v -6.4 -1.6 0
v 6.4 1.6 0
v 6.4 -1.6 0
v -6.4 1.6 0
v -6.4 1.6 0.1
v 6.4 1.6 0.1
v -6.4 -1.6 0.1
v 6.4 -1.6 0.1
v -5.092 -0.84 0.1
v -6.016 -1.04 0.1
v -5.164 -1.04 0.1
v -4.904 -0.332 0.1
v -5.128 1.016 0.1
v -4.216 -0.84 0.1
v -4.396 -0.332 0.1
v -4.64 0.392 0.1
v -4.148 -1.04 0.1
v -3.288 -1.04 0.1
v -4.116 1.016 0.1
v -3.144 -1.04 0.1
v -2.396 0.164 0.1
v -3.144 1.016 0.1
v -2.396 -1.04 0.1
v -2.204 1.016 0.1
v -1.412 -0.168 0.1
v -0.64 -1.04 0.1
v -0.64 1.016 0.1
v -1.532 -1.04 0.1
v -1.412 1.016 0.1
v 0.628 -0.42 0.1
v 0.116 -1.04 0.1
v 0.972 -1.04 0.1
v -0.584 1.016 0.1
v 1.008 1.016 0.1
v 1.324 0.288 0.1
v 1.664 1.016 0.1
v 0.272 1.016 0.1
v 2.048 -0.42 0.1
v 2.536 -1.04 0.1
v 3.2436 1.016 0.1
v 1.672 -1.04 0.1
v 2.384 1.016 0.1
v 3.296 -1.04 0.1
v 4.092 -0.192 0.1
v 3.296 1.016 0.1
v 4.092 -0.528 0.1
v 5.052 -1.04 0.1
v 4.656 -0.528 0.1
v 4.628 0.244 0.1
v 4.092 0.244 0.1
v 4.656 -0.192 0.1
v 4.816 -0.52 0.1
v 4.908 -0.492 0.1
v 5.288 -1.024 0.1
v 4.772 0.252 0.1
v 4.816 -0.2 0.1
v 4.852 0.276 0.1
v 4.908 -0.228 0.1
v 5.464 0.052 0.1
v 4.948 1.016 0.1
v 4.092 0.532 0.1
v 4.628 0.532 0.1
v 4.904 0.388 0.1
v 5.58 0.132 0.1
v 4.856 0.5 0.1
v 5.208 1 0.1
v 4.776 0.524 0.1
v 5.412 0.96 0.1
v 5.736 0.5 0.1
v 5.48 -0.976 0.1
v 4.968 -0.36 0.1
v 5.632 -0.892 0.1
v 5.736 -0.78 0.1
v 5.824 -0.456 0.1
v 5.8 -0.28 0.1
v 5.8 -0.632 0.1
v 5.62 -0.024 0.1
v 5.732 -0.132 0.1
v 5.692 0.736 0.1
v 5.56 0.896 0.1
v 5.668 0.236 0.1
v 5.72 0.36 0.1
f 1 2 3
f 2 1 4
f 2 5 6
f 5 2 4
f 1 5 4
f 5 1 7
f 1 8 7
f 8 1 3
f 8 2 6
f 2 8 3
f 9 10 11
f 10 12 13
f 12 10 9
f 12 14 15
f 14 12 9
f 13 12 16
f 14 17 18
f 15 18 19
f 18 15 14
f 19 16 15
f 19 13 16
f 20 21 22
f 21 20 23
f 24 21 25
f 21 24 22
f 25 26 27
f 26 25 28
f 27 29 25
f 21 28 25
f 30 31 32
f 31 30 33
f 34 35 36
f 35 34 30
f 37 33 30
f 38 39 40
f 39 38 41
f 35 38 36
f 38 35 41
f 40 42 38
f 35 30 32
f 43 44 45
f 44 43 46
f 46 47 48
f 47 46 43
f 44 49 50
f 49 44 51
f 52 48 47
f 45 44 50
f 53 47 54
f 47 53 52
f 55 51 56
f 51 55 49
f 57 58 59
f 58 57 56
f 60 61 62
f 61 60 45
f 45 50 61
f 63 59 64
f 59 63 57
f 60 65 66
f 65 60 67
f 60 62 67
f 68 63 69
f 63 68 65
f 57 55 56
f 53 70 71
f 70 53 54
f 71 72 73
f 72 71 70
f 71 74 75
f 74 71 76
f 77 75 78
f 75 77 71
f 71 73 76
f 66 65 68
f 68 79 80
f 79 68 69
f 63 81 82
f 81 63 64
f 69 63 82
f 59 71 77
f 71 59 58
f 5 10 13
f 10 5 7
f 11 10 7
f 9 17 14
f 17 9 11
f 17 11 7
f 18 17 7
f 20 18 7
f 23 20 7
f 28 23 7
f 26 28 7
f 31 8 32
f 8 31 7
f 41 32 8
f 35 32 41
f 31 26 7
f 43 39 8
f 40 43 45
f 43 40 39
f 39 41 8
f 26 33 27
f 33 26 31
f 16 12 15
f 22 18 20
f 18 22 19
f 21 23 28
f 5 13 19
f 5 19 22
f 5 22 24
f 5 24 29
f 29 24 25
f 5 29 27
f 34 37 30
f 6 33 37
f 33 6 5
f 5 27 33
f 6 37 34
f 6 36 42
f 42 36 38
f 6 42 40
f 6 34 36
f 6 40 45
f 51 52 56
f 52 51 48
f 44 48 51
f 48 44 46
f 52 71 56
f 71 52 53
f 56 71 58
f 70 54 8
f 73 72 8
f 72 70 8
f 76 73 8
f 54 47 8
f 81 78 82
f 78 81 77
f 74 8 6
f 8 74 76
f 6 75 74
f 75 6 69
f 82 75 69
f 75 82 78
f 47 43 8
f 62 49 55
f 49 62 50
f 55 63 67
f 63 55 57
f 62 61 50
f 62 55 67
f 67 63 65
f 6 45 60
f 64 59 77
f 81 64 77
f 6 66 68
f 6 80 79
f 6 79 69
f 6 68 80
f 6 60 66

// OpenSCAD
// file: ../p/box5-12.scad
use <../lib.scad>
function ldraw_lib__box5_12() = [
// 0 Box with 5 Faces without Any Edges
// 0 Name: box5-12.dat
// 0 Author: Chris Dee [cwdee]
// 0 !LDRAW_ORG Primitive UPDATE 2009-02
// 0 !LICENSE Licensed under CC BY 4.0 : see CAreadme.txt
// 
// 0 BFC CERTIFY CCW
  [0,"BFC","CERTIFY"],
  [0,"BFC","CCW"],
// 
// 0 !HISTORY 2009-09-03 [PTadmin] Official Update 2009-02
// 
// 
// 4 16 1 1 1 1 1 -1 -1 1 -1 -1 1 1
  [4,16,1,1,1,1,1,-1,-1,1,-1,-1,1,1],
// 4 16 -1 0 1 1 0 1 1 1 1 -1 1 1
  [4,16,-1,0,1,1,0,1,1,1,1,-1,1,1],
// 4 16 -1 0 -1 -1 0 1 -1 1 1 -1 1 -1
  [4,16,-1,0,-1,-1,0,1,-1,1,1,-1,1,-1],
// 4 16 1 0 -1 -1 0 -1 -1 1 -1 1 1 -1
  [4,16,1,0,-1,-1,0,-1,-1,1,-1,1,1,-1],
// 4 16 1 0 1 1 0 -1 1 1 -1 1 1 1
  [4,16,1,0,1,1,0,-1,1,1,-1,1,1,1],
// 0
];
module ldraw_lib__box5_12(step=0, col=false, unit=2/5, alt=false, line=0.2, solid=!$preview)
    makepoly(ldraw_lib__box5_12(), step=step, col=col, unit=unit, alt=alt, line=line, solid=solid);
ldraw_lib__box5_12(line=0.2);
// main file
use <../lib.scad>
use <../p/box5-12.scad>
function ldraw_lib__194535a() = [
// 0 Sticker  0.4 x  1.6 with Black "ANWB" on Transparent Background
// 0 Name: 194535a.dat
// 0 Author: Takeshi Takahashi [RainbowDolphin]
// 0 !LDRAW_ORG Part UPDATE 2023-01
// 0 !LICENSE Licensed under CC BY 4.0 : see CAreadme.txt
// 
// 0 BFC CERTIFY CCW
  [0,"BFC","CERTIFY"],
  [0,"BFC","CCW"],
// 
// 0 !KEYWORDS Bricklink 1590.2stk01, Brickowl 599539, Netherlands
// 0 !KEYWORDS Rebrickable 194535, Road service, Set 1590-2
// 
// 0 !HISTORY 2023-03-05 [OrionP] Official Update 2023-01
// 
// 
// 1 16 0 -0.25 0 16 0 0 0 0.25 0 0 0 4 box5-12.dat
  [1,16,0,-0.25,0,16,0,0,0,0.25,0,0,0,4, ldraw_lib__box5_12()],
// 0 BFC NOCLIP
  [0,"BFC","NOCLIP"],
// 3 0 -12.73 -0.25 -2.1 -15.04 -0.25 -2.6 -12.91 -0.25 -2.6
  [3,0,-12.73,-0.25,-2.1,-15.04,-0.25,-2.6,-12.91,-0.25,-2.6],
// 4 0 -12.26 -0.25 -0.83 -12.82 -0.25 2.54 -15.04 -0.25 -2.6 -12.73 -0.25 -2.1
  [4,0,-12.26,-0.25,-0.83,-12.82,-0.25,2.54,-15.04,-0.25,-2.6,-12.73,-0.25,-2.1],
// 4 0 -12.26 -0.25 -0.83 -12.73 -0.25 -2.1 -10.54 -0.25 -2.1 -10.99 -0.25 -0.83
  [4,0,-12.26,-0.25,-0.83,-12.73,-0.25,-2.1,-10.54,-0.25,-2.1,-10.99,-0.25,-0.83],
// 3 0 -12.82 -0.25 2.54 -12.26 -0.25 -0.83 -11.6 -0.25 0.98
  [3,0,-12.82,-0.25,2.54,-12.26,-0.25,-0.83,-11.6,-0.25,0.98],
// 3 0 -10.54 -0.25 -2.1 -10.37 -0.25 -2.6 -8.22 -0.25 -2.6
  [3,0,-10.54,-0.25,-2.1,-10.37,-0.25,-2.6,-8.22,-0.25,-2.6],
// 4 0 -10.99 -0.25 -0.83 -10.54 -0.25 -2.1 -8.22 -0.25 -2.6 -10.29 -0.25 2.54
  [4,0,-10.99,-0.25,-0.83,-10.54,-0.25,-2.1,-8.22,-0.25,-2.6,-10.29,-0.25,2.54],
// 3 0 -10.29 -0.25 2.54 -11.6 -0.25 0.98 -10.99 -0.25 -0.83
  [3,0,-10.29,-0.25,2.54,-11.6,-0.25,0.98,-10.99,-0.25,-0.83],
// 3 0 -10.29 -0.25 2.54 -12.82 -0.25 2.54 -11.6 -0.25 0.98
  [3,0,-10.29,-0.25,2.54,-12.82,-0.25,2.54,-11.6,-0.25,0.98],
// 4 0 -7.86 -0.25 -2.6 -5.99 -0.25 -2.6 -5.99 -0.25 0.41 -7.86 -0.25 2.54
  [4,0,-7.86,-0.25,-2.6,-5.99,-0.25,-2.6,-5.99,-0.25,0.41,-7.86,-0.25,2.54],
// 4 0 -5.51 -0.25 2.54 -7.86 -0.25 2.54 -5.99 -0.25 0.41 -3.53 -0.25 -0.42
  [4,0,-5.51,-0.25,2.54,-7.86,-0.25,2.54,-5.99,-0.25,0.41,-3.53,-0.25,-0.42],
// 4 0 -3.53 -0.25 -0.42 -3.83 -0.25 -2.6 -1.6 -0.25 -2.6 -1.6 -0.25 2.54
  [4,0,-3.53,-0.25,-0.42,-3.83,-0.25,-2.6,-1.6,-0.25,-2.6,-1.6,-0.25,2.54],
// 3 0 -1.6 -0.25 2.54 -3.53 -0.25 2.54 -3.53 -0.25 -0.42
  [3,0,-1.6,-0.25,2.54,-3.53,-0.25,2.54,-3.53,-0.25,-0.42],
// 3 0 -5.99 -0.25 0.41 -3.83 -0.25 -2.6 -3.53 -0.25 -0.42
  [3,0,-5.99,-0.25,0.41,-3.83,-0.25,-2.6,-3.53,-0.25,-0.42],
// 4 0 0.29 -0.25 -2.6 2.43 -0.25 -2.6 1.57 -0.25 -1.05 -1.46 -0.25 2.54
  [4,0,0.29,-0.25,-2.6,2.43,-0.25,-2.6,1.57,-0.25,-1.05,-1.46,-0.25,2.54],
// 4 0 2.52 -0.25 2.54 1.57 -0.25 -1.05 3.31 -0.25 0.72 4.16 -0.25 2.54
  [4,0,2.52,-0.25,2.54,1.57,-0.25,-1.05,3.31,-0.25,0.72,4.16,-0.25,2.54],
// 3 0 0.68 -0.25 2.54 -1.46 -0.25 2.54 1.57 -0.25 -1.05
  [3,0,0.68,-0.25,2.54,-1.46,-0.25,2.54,1.57,-0.25,-1.05],
// 4 0 5.12 -0.25 -1.05 4.18 -0.25 -2.6 6.34 -0.25 -2.6 8.109 -0.25 2.54
  [4,0,5.12,-0.25,-1.05,4.18,-0.25,-2.6,6.34,-0.25,-2.6,8.109,-0.25,2.54],
// 4 0 3.31 -0.25 0.72 4.18 -0.25 -2.6 5.12 -0.25 -1.05 4.16 -0.25 2.54
  [4,0,3.31,-0.25,0.72,4.18,-0.25,-2.6,5.12,-0.25,-1.05,4.16,-0.25,2.54],
// 3 0 8.109 -0.25 2.54 5.96 -0.25 2.54 5.12 -0.25 -1.05
  [3,0,8.109,-0.25,2.54,5.96,-0.25,2.54,5.12,-0.25,-1.05],
// 3 0 3.31 -0.25 0.72 1.57 -0.25 -1.05 2.43 -0.25 -2.6
  [3,0,3.31,-0.25,0.72,1.57,-0.25,-1.05,2.43,-0.25,-2.6],
// 4 0 8.24 -0.25 -2.6 10.23 -0.25 -1.32 10.23 -0.25 -0.48 8.24 -0.25 2.54
  [4,0,8.24,-0.25,-2.6,10.23,-0.25,-1.32,10.23,-0.25,-0.48,8.24,-0.25,2.54],
// 4 0 12.63 -0.25 -2.6 11.64 -0.25 -1.32 10.23 -0.25 -1.32 8.24 -0.25 -2.6
  [4,0,12.63,-0.25,-2.6,11.64,-0.25,-1.32,10.23,-0.25,-1.32,8.24,-0.25,-2.6],
// 4 0 11.57 -0.25 0.61 10.23 -0.25 0.61 10.23 -0.25 -0.48 11.64 -0.25 -0.48
  [4,0,11.57,-0.25,0.61,10.23,-0.25,0.61,10.23,-0.25,-0.48,11.64,-0.25,-0.48],
// 3 0 12.04 -0.25 -1.3 11.64 -0.25 -1.32 12.63 -0.25 -2.6
  [3,0,12.04,-0.25,-1.3,11.64,-0.25,-1.32,12.63,-0.25,-2.6],
// 3 0 8.24 -0.25 2.54 10.23 -0.25 -0.48 10.23 -0.25 0.61
  [3,0,8.24,-0.25,2.54,10.23,-0.25,-0.48,10.23,-0.25,0.61],
// 4 0 12.27 -0.25 -1.23 12.04 -0.25 -1.3 12.63 -0.25 -2.6 13.22 -0.25 -2.56
  [4,0,12.27,-0.25,-1.23,12.04,-0.25,-1.3,12.63,-0.25,-2.6,13.22,-0.25,-2.56],
// 4 0 11.64 -0.25 -0.48 12.04 -0.25 -0.5 11.93 -0.25 0.63 11.57 -0.25 0.61
  [4,0,11.64,-0.25,-0.48,12.04,-0.25,-0.5,11.93,-0.25,0.63,11.57,-0.25,0.61],
// 4 0 12.27 -0.25 -0.57 13.66 -0.25 0.13 12.13 -0.25 0.69 12.04 -0.25 -0.5
  [4,0,12.27,-0.25,-0.57,13.66,-0.25,0.13,12.13,-0.25,0.69,12.04,-0.25,-0.5],
// 4 0 12.37 -0.25 2.54 8.24 -0.25 2.54 10.23 -0.25 1.33 11.57 -0.25 1.33
  [4,0,12.37,-0.25,2.54,8.24,-0.25,2.54,10.23,-0.25,1.33,11.57,-0.25,1.33],
// 3 0 8.24 -0.25 2.54 10.23 -0.25 0.61 10.23 -0.25 1.33
  [3,0,8.24,-0.25,2.54,10.23,-0.25,0.61,10.23,-0.25,1.33],
// 4 0 12.26 -0.25 0.97 12.13 -0.25 0.69 13.66 -0.25 0.13 13.95 -0.25 0.33
  [4,0,12.26,-0.25,0.97,12.13,-0.25,0.69,13.66,-0.25,0.13,13.95,-0.25,0.33],
// 4 0 12.37 -0.25 2.54 11.94 -0.25 1.31 12.14 -0.25 1.25 13.02 -0.25 2.5
  [4,0,12.37,-0.25,2.54,11.94,-0.25,1.31,12.14,-0.25,1.25,13.02,-0.25,2.5],
// 3 0 12.37 -0.25 2.54 11.57 -0.25 1.33 11.94 -0.25 1.31
  [3,0,12.37,-0.25,2.54,11.57,-0.25,1.33,11.94,-0.25,1.31],
// 4 0 13.53 -0.25 2.4 12.14 -0.25 1.25 12.26 -0.25 0.97 14.34 -0.25 1.25
  [4,0,13.53,-0.25,2.4,12.14,-0.25,1.25,12.26,-0.25,0.97,14.34,-0.25,1.25],
// 3 0 12.13 -0.25 0.69 11.93 -0.25 0.63 12.04 -0.25 -0.5
  [3,0,12.13,-0.25,0.69,11.93,-0.25,0.63,12.04,-0.25,-0.5],
// 4 0 12.27 -0.25 -1.23 13.22 -0.25 -2.56 13.7 -0.25 -2.44 12.42 -0.25 -0.9
  [4,0,12.27,-0.25,-1.23,13.22,-0.25,-2.56,13.7,-0.25,-2.44,12.42,-0.25,-0.9],
// 4 0 12.42 -0.25 -0.9 13.7 -0.25 -2.44 14.08 -0.25 -2.23 14.34 -0.25 -1.95
  [4,0,12.42,-0.25,-0.9,13.7,-0.25,-2.44,14.08,-0.25,-2.23,14.34,-0.25,-1.95],
// 4 0 12.42 -0.25 -0.9 14.5 -0.25 -1.58 14.56 -0.25 -1.14 14.5 -0.25 -0.7
  [4,0,12.42,-0.25,-0.9,14.5,-0.25,-1.58,14.56,-0.25,-1.14,14.5,-0.25,-0.7],
// 4 0 12.42 -0.25 -0.9 14.5 -0.25 -0.7 14.33 -0.25 -0.33 14.05 -0.25 -0.06
  [4,0,12.42,-0.25,-0.9,14.5,-0.25,-0.7,14.33,-0.25,-0.33,14.05,-0.25,-0.06],
// 3 0 12.42 -0.25 -0.9 14.34 -0.25 -1.95 14.5 -0.25 -1.58
  [3,0,12.42,-0.25,-0.9,14.34,-0.25,-1.95,14.5,-0.25,-1.58],
// 3 0 13.02 -0.25 2.5 12.14 -0.25 1.25 13.53 -0.25 2.4
  [3,0,13.02,-0.25,2.5,12.14,-0.25,1.25,13.53,-0.25,2.4],
// 4 0 14.23 -0.25 1.84 13.9 -0.25 2.24 13.53 -0.25 2.4 14.34 -0.25 1.25
  [4,0,14.23,-0.25,1.84,13.9,-0.25,2.24,13.53,-0.25,2.4,14.34,-0.25,1.25],
// 4 0 12.26 -0.25 0.97 13.95 -0.25 0.33 14.17 -0.25 0.59 14.3 -0.25 0.9
  [4,0,12.26,-0.25,0.97,13.95,-0.25,0.33,14.17,-0.25,0.59,14.3,-0.25,0.9],
// 3 0 14.34 -0.25 1.25 12.26 -0.25 0.97 14.3 -0.25 0.9
  [3,0,14.34,-0.25,1.25,12.26,-0.25,0.97,14.3,-0.25,0.9],
// 4 0 12.42 -0.25 -0.9 14.05 -0.25 -0.06 13.66 -0.25 0.13 12.27 -0.25 -0.57
  [4,0,12.42,-0.25,-0.9,14.05,-0.25,-0.06,13.66,-0.25,0.13,12.27,-0.25,-0.57],
// 0 BFC CLIP
  [0,"BFC","CLIP"],
// 4 16 -16 -0.25 4 -16 -0.25 -4 -15.04 -0.25 -2.6 -12.82 -0.25 2.54
  [4,16,-16,-0.25,4,-16,-0.25,-4,-15.04,-0.25,-2.6,-12.82,-0.25,2.54],
// 3 16 -12.91 -0.25 -2.6 -15.04 -0.25 -2.6 -16 -0.25 -4
  [3,16,-12.91,-0.25,-2.6,-15.04,-0.25,-2.6,-16,-0.25,-4],
// 4 16 -12.73 -0.25 -2.1 -12.91 -0.25 -2.6 -10.37 -0.25 -2.6 -10.54 -0.25 -2.1
  [4,16,-12.73,-0.25,-2.1,-12.91,-0.25,-2.6,-10.37,-0.25,-2.6,-10.54,-0.25,-2.1],
// 3 16 -10.37 -0.25 -2.6 -12.91 -0.25 -2.6 -16 -0.25 -4
  [3,16,-10.37,-0.25,-2.6,-12.91,-0.25,-2.6,-16,-0.25,-4],
// 3 16 -8.22 -0.25 -2.6 -10.37 -0.25 -2.6 -16 -0.25 -4
  [3,16,-8.22,-0.25,-2.6,-10.37,-0.25,-2.6,-16,-0.25,-4],
// 3 16 -7.86 -0.25 -2.6 -8.22 -0.25 -2.6 -16 -0.25 -4
  [3,16,-7.86,-0.25,-2.6,-8.22,-0.25,-2.6,-16,-0.25,-4],
// 3 16 -5.99 -0.25 -2.6 -7.86 -0.25 -2.6 -16 -0.25 -4
  [3,16,-5.99,-0.25,-2.6,-7.86,-0.25,-2.6,-16,-0.25,-4],
// 3 16 -3.83 -0.25 -2.6 -5.99 -0.25 -2.6 -16 -0.25 -4
  [3,16,-3.83,-0.25,-2.6,-5.99,-0.25,-2.6,-16,-0.25,-4],
// 3 16 -1.6 -0.25 -2.6 -3.83 -0.25 -2.6 -16 -0.25 -4
  [3,16,-1.6,-0.25,-2.6,-3.83,-0.25,-2.6,-16,-0.25,-4],
// 4 16 16 -0.25 -4 2.43 -0.25 -2.6 0.29 -0.25 -2.6 -16 -0.25 -4
  [4,16,16,-0.25,-4,2.43,-0.25,-2.6,0.29,-0.25,-2.6,-16,-0.25,-4],
// 3 16 4.18 -0.25 -2.6 2.43 -0.25 -2.6 16 -0.25 -4
  [3,16,4.18,-0.25,-2.6,2.43,-0.25,-2.6,16,-0.25,-4],
// 3 16 3.31 -0.25 0.72 2.43 -0.25 -2.6 4.18 -0.25 -2.6
  [3,16,3.31,-0.25,0.72,2.43,-0.25,-2.6,4.18,-0.25,-2.6],
// 3 16 0.29 -0.25 -2.6 -1.6 -0.25 -2.6 -16 -0.25 -4
  [3,16,0.29,-0.25,-2.6,-1.6,-0.25,-2.6,-16,-0.25,-4],
// 3 16 8.24 -0.25 -2.6 6.34 -0.25 -2.6 16 -0.25 -4
  [3,16,8.24,-0.25,-2.6,6.34,-0.25,-2.6,16,-0.25,-4],
// 4 16 8.109 -0.25 2.54 6.34 -0.25 -2.6 8.24 -0.25 -2.6 8.24 -0.25 2.54
  [4,16,8.109,-0.25,2.54,6.34,-0.25,-2.6,8.24,-0.25,-2.6,8.24,-0.25,2.54],
// 3 16 6.34 -0.25 -2.6 4.18 -0.25 -2.6 16 -0.25 -4
  [3,16,6.34,-0.25,-2.6,4.18,-0.25,-2.6,16,-0.25,-4],
// 4 16 -1.6 -0.25 -2.6 0.29 -0.25 -2.6 -1.46 -0.25 2.54 -1.6 -0.25 2.54
  [4,16,-1.6,-0.25,-2.6,0.29,-0.25,-2.6,-1.46,-0.25,2.54,-1.6,-0.25,2.54],
// 3 16 -11.6 -0.25 0.98 -12.26 -0.25 -0.83 -10.99 -0.25 -0.83
  [3,16,-11.6,-0.25,0.98,-12.26,-0.25,-0.83,-10.99,-0.25,-0.83],
// 4 16 -8.22 -0.25 -2.6 -7.86 -0.25 -2.6 -7.86 -0.25 2.54 -10.29 -0.25 2.54
  [4,16,-8.22,-0.25,-2.6,-7.86,-0.25,-2.6,-7.86,-0.25,2.54,-10.29,-0.25,2.54],
// 3 16 -5.99 -0.25 0.41 -5.99 -0.25 -2.6 -3.83 -0.25 -2.6
  [3,16,-5.99,-0.25,0.41,-5.99,-0.25,-2.6,-3.83,-0.25,-2.6],
// 3 16 -16 -0.25 4 -12.82 -0.25 2.54 -10.29 -0.25 2.54
  [3,16,-16,-0.25,4,-12.82,-0.25,2.54,-10.29,-0.25,2.54],
// 3 16 -16 -0.25 4 -10.29 -0.25 2.54 -7.86 -0.25 2.54
  [3,16,-16,-0.25,4,-10.29,-0.25,2.54,-7.86,-0.25,2.54],
// 3 16 -16 -0.25 4 -7.86 -0.25 2.54 -5.51 -0.25 2.54
  [3,16,-16,-0.25,4,-7.86,-0.25,2.54,-5.51,-0.25,2.54],
// 3 16 -16 -0.25 4 -5.51 -0.25 2.54 -3.53 -0.25 2.54
  [3,16,-16,-0.25,4,-5.51,-0.25,2.54,-3.53,-0.25,2.54],
// 3 16 -3.53 -0.25 2.54 -5.51 -0.25 2.54 -3.53 -0.25 -0.42
  [3,16,-3.53,-0.25,2.54,-5.51,-0.25,2.54,-3.53,-0.25,-0.42],
// 3 16 -16 -0.25 4 -3.53 -0.25 2.54 -1.6 -0.25 2.54
  [3,16,-16,-0.25,4,-3.53,-0.25,2.54,-1.6,-0.25,2.54],
// 3 16 2.52 -0.25 2.54 0.68 -0.25 2.54 1.57 -0.25 -1.05
  [3,16,2.52,-0.25,2.54,0.68,-0.25,2.54,1.57,-0.25,-1.05],
// 4 16 -16 -0.25 4 -1.46 -0.25 2.54 0.68 -0.25 2.54 16 -0.25 4
  [4,16,-16,-0.25,4,-1.46,-0.25,2.54,0.68,-0.25,2.54,16,-0.25,4],
// 3 16 -16 -0.25 4 -1.6 -0.25 2.54 -1.46 -0.25 2.54
  [3,16,-16,-0.25,4,-1.6,-0.25,2.54,-1.46,-0.25,2.54],
// 3 16 16 -0.25 4 0.68 -0.25 2.54 2.52 -0.25 2.54
  [3,16,16,-0.25,4,0.68,-0.25,2.54,2.52,-0.25,2.54],
// 3 16 16 -0.25 4 4.16 -0.25 2.54 5.96 -0.25 2.54
  [3,16,16,-0.25,4,4.16,-0.25,2.54,5.96,-0.25,2.54],
// 3 16 5.96 -0.25 2.54 4.16 -0.25 2.54 5.12 -0.25 -1.05
  [3,16,5.96,-0.25,2.54,4.16,-0.25,2.54,5.12,-0.25,-1.05],
// 3 16 16 -0.25 4 5.96 -0.25 2.54 8.109 -0.25 2.54
  [3,16,16,-0.25,4,5.96,-0.25,2.54,8.109,-0.25,2.54],
// 3 16 16 -0.25 4 2.52 -0.25 2.54 4.16 -0.25 2.54
  [3,16,16,-0.25,4,2.52,-0.25,2.54,4.16,-0.25,2.54],
// 3 16 16 -0.25 4 8.109 -0.25 2.54 8.24 -0.25 2.54
  [3,16,16,-0.25,4,8.109,-0.25,2.54,8.24,-0.25,2.54],
// 4 16 11.64 -0.25 -1.32 12.04 -0.25 -1.3 12.04 -0.25 -0.5 11.64 -0.25 -0.48
  [4,16,11.64,-0.25,-1.32,12.04,-0.25,-1.3,12.04,-0.25,-0.5,11.64,-0.25,-0.48],
// 4 16 10.23 -0.25 -0.48 10.23 -0.25 -1.32 11.64 -0.25 -1.32 11.64 -0.25 -0.48
  [4,16,10.23,-0.25,-0.48,10.23,-0.25,-1.32,11.64,-0.25,-1.32,11.64,-0.25,-0.48],
// 4 16 12.04 -0.25 -1.3 12.27 -0.25 -1.23 12.42 -0.25 -0.9 12.04 -0.25 -0.5
  [4,16,12.04,-0.25,-1.3,12.27,-0.25,-1.23,12.42,-0.25,-0.9,12.04,-0.25,-0.5],
// 3 16 12.04 -0.25 -0.5 12.42 -0.25 -0.9 12.27 -0.25 -0.57
  [3,16,12.04,-0.25,-0.5,12.42,-0.25,-0.9,12.27,-0.25,-0.57],
// 3 16 13.7 -0.25 -2.44 13.22 -0.25 -2.56 16 -0.25 -4
  [3,16,13.7,-0.25,-2.44,13.22,-0.25,-2.56,16,-0.25,-4],
// 3 16 14.34 -0.25 -1.95 14.08 -0.25 -2.23 16 -0.25 -4
  [3,16,14.34,-0.25,-1.95,14.08,-0.25,-2.23,16,-0.25,-4],
// 3 16 14.08 -0.25 -2.23 13.7 -0.25 -2.44 16 -0.25 -4
  [3,16,14.08,-0.25,-2.23,13.7,-0.25,-2.44,16,-0.25,-4],
// 3 16 14.5 -0.25 -1.58 14.34 -0.25 -1.95 16 -0.25 -4
  [3,16,14.5,-0.25,-1.58,14.34,-0.25,-1.95,16,-0.25,-4],
// 3 16 13.22 -0.25 -2.56 12.63 -0.25 -2.6 16 -0.25 -4
  [3,16,13.22,-0.25,-2.56,12.63,-0.25,-2.6,16,-0.25,-4],
// 4 16 14.17 -0.25 0.59 14.05 -0.25 -0.06 14.33 -0.25 -0.33 14.3 -0.25 0.9
  [4,16,14.17,-0.25,0.59,14.05,-0.25,-0.06,14.33,-0.25,-0.33,14.3,-0.25,0.9],
// 4 16 14.56 -0.25 -1.14 14.5 -0.25 -1.58 16 -0.25 -4 16 -0.25 4
  [4,16,14.56,-0.25,-1.14,14.5,-0.25,-1.58,16,-0.25,-4,16,-0.25,4],
// 4 16 14.5 -0.25 -0.7 14.56 -0.25 -1.14 16 -0.25 4 14.34 -0.25 1.25
  [4,16,14.5,-0.25,-0.7,14.56,-0.25,-1.14,16,-0.25,4,14.34,-0.25,1.25],
// 4 16 14.3 -0.25 0.9 14.33 -0.25 -0.33 14.5 -0.25 -0.7 14.34 -0.25 1.25
  [4,16,14.3,-0.25,0.9,14.33,-0.25,-0.33,14.5,-0.25,-0.7,14.34,-0.25,1.25],
// 3 16 12.63 -0.25 -2.6 8.24 -0.25 -2.6 16 -0.25 -4
  [3,16,12.63,-0.25,-2.6,8.24,-0.25,-2.6,16,-0.25,-4],
// 4 16 11.57 -0.25 1.33 10.23 -0.25 0.61 11.57 -0.25 0.61 11.93 -0.25 0.63
  [4,16,11.57,-0.25,1.33,10.23,-0.25,0.61,11.57,-0.25,0.61,11.93,-0.25,0.63],
// 4 16 11.93 -0.25 0.63 12.13 -0.25 0.69 12.26 -0.25 0.97 11.94 -0.25 1.31
  [4,16,11.93,-0.25,0.63,12.13,-0.25,0.69,12.26,-0.25,0.97,11.94,-0.25,1.31],
// 3 16 11.57 -0.25 1.33 10.23 -0.25 1.33 10.23 -0.25 0.61
  [3,16,11.57,-0.25,1.33,10.23,-0.25,1.33,10.23,-0.25,0.61],
// 3 16 11.57 -0.25 1.33 11.93 -0.25 0.63 11.94 -0.25 1.31
  [3,16,11.57,-0.25,1.33,11.93,-0.25,0.63,11.94,-0.25,1.31],
// 3 16 11.94 -0.25 1.31 12.26 -0.25 0.97 12.14 -0.25 1.25
  [3,16,11.94,-0.25,1.31,12.26,-0.25,0.97,12.14,-0.25,1.25],
// 3 16 16 -0.25 4 8.24 -0.25 2.54 12.37 -0.25 2.54
  [3,16,16,-0.25,4,8.24,-0.25,2.54,12.37,-0.25,2.54],
// 3 16 13.95 -0.25 0.33 13.66 -0.25 0.13 14.05 -0.25 -0.06
  [3,16,13.95,-0.25,0.33,13.66,-0.25,0.13,14.05,-0.25,-0.06],
// 3 16 14.17 -0.25 0.59 13.95 -0.25 0.33 14.05 -0.25 -0.06
  [3,16,14.17,-0.25,0.59,13.95,-0.25,0.33,14.05,-0.25,-0.06],
// 3 16 16 -0.25 4 13.02 -0.25 2.5 13.53 -0.25 2.4
  [3,16,16,-0.25,4,13.02,-0.25,2.5,13.53,-0.25,2.4],
// 3 16 16 -0.25 4 13.9 -0.25 2.24 14.23 -0.25 1.84
  [3,16,16,-0.25,4,13.9,-0.25,2.24,14.23,-0.25,1.84],
// 3 16 16 -0.25 4 14.23 -0.25 1.84 14.34 -0.25 1.25
  [3,16,16,-0.25,4,14.23,-0.25,1.84,14.34,-0.25,1.25],
// 3 16 16 -0.25 4 13.53 -0.25 2.4 13.9 -0.25 2.24
  [3,16,16,-0.25,4,13.53,-0.25,2.4,13.9,-0.25,2.24],
// 3 16 16 -0.25 4 12.37 -0.25 2.54 13.02 -0.25 2.5
  [3,16,16,-0.25,4,12.37,-0.25,2.54,13.02,-0.25,2.5],
];
module ldraw_lib__194535a(step=0, col=false, unit=2/5, alt=false, line=0.2, solid=!$preview)
    makepoly(ldraw_lib__194535a(), step=step, col=col, unit=unit, alt=alt, line=line, solid=solid);
ldraw_lib__194535a(line=0.2);
